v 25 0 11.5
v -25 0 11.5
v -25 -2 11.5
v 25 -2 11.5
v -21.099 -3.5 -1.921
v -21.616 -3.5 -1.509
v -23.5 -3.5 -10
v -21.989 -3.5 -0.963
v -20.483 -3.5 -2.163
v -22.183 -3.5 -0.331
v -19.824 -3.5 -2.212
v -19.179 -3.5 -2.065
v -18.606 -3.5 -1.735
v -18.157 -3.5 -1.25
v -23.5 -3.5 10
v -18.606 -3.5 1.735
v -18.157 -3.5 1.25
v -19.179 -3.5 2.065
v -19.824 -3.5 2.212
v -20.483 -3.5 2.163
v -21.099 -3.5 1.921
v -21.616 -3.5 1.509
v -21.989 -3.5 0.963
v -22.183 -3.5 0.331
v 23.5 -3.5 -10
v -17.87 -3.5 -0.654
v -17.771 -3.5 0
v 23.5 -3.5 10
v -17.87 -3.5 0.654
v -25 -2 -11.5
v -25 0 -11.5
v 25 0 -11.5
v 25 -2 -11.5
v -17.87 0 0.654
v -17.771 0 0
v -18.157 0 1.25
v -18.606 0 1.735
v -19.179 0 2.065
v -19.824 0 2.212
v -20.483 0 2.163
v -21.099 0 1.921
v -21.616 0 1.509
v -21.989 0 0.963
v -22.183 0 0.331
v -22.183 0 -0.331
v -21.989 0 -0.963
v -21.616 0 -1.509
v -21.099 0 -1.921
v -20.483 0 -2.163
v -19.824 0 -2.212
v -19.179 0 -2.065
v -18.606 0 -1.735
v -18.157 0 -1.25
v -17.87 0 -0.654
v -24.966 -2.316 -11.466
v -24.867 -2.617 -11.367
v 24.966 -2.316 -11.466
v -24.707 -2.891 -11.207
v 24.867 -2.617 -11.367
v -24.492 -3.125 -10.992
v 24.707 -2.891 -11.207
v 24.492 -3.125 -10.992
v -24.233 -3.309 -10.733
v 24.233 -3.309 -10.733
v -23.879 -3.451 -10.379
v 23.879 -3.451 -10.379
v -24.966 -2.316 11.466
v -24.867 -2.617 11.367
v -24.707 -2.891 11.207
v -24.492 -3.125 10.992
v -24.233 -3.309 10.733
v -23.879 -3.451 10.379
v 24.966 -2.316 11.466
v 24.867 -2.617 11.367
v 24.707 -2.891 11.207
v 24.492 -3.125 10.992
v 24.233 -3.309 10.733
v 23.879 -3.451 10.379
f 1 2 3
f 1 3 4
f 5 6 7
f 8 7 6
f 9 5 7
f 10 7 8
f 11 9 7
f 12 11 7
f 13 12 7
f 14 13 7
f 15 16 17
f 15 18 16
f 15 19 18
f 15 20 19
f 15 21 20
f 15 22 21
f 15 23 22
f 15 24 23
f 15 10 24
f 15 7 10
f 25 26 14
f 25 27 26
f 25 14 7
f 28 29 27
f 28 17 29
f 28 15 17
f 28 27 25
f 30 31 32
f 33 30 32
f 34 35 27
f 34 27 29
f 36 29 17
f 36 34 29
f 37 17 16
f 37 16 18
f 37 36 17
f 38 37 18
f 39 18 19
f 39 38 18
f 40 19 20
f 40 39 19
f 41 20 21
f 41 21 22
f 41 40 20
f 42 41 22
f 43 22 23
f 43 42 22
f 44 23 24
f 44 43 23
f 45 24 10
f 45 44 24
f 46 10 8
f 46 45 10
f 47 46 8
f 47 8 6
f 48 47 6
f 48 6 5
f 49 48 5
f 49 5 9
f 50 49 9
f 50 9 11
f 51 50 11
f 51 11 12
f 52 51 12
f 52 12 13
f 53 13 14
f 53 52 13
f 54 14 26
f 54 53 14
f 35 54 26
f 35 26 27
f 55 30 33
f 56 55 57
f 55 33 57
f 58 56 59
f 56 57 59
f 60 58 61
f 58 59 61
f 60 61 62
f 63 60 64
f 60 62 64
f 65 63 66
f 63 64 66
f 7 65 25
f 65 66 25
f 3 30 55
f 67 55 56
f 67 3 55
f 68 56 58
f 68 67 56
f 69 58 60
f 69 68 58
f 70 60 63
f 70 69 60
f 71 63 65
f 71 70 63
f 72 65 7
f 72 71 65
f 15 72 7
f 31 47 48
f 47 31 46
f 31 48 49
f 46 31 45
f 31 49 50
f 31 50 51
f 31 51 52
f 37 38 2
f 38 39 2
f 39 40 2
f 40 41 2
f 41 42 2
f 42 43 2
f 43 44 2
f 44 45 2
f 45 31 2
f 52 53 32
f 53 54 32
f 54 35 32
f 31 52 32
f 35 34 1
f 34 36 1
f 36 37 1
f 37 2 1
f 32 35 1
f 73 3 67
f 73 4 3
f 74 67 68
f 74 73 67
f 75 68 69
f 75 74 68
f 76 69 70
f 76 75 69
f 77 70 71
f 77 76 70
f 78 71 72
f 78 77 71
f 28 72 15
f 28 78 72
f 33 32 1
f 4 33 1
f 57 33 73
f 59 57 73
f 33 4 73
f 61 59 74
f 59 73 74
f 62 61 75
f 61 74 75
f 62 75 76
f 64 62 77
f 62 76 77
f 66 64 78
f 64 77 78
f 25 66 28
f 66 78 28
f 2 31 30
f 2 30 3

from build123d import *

# Parameters (mm, degrees)
F0_W     = 50
F0_H     = 23
F0_R     = 2.21862
F1_DEPTH = 3.5
F2_R     = 1.5


with BuildPart() as f1:
    # F0 (on Front) → F1 (new body)
    with BuildSketch(Plane.XZ):
        Rectangle(F0_W, F0_H)
        with Locations((-19.98966, 0)):
            Circle(F0_R, mode=Mode.SUBTRACT)
    extrude(amount=F1_DEPTH)

    # F2
    f2_edges = [f1.edges().sort_by_distance(p)[0] for p in [
        (0, -3.5, -11.5),
        (-25, -3.5, 0),
        (25, -3.5, 0),
        (0, -3.5, 11.5),
    ]]
    fillet(f2_edges, radius=F2_R)


solid = f1.part
